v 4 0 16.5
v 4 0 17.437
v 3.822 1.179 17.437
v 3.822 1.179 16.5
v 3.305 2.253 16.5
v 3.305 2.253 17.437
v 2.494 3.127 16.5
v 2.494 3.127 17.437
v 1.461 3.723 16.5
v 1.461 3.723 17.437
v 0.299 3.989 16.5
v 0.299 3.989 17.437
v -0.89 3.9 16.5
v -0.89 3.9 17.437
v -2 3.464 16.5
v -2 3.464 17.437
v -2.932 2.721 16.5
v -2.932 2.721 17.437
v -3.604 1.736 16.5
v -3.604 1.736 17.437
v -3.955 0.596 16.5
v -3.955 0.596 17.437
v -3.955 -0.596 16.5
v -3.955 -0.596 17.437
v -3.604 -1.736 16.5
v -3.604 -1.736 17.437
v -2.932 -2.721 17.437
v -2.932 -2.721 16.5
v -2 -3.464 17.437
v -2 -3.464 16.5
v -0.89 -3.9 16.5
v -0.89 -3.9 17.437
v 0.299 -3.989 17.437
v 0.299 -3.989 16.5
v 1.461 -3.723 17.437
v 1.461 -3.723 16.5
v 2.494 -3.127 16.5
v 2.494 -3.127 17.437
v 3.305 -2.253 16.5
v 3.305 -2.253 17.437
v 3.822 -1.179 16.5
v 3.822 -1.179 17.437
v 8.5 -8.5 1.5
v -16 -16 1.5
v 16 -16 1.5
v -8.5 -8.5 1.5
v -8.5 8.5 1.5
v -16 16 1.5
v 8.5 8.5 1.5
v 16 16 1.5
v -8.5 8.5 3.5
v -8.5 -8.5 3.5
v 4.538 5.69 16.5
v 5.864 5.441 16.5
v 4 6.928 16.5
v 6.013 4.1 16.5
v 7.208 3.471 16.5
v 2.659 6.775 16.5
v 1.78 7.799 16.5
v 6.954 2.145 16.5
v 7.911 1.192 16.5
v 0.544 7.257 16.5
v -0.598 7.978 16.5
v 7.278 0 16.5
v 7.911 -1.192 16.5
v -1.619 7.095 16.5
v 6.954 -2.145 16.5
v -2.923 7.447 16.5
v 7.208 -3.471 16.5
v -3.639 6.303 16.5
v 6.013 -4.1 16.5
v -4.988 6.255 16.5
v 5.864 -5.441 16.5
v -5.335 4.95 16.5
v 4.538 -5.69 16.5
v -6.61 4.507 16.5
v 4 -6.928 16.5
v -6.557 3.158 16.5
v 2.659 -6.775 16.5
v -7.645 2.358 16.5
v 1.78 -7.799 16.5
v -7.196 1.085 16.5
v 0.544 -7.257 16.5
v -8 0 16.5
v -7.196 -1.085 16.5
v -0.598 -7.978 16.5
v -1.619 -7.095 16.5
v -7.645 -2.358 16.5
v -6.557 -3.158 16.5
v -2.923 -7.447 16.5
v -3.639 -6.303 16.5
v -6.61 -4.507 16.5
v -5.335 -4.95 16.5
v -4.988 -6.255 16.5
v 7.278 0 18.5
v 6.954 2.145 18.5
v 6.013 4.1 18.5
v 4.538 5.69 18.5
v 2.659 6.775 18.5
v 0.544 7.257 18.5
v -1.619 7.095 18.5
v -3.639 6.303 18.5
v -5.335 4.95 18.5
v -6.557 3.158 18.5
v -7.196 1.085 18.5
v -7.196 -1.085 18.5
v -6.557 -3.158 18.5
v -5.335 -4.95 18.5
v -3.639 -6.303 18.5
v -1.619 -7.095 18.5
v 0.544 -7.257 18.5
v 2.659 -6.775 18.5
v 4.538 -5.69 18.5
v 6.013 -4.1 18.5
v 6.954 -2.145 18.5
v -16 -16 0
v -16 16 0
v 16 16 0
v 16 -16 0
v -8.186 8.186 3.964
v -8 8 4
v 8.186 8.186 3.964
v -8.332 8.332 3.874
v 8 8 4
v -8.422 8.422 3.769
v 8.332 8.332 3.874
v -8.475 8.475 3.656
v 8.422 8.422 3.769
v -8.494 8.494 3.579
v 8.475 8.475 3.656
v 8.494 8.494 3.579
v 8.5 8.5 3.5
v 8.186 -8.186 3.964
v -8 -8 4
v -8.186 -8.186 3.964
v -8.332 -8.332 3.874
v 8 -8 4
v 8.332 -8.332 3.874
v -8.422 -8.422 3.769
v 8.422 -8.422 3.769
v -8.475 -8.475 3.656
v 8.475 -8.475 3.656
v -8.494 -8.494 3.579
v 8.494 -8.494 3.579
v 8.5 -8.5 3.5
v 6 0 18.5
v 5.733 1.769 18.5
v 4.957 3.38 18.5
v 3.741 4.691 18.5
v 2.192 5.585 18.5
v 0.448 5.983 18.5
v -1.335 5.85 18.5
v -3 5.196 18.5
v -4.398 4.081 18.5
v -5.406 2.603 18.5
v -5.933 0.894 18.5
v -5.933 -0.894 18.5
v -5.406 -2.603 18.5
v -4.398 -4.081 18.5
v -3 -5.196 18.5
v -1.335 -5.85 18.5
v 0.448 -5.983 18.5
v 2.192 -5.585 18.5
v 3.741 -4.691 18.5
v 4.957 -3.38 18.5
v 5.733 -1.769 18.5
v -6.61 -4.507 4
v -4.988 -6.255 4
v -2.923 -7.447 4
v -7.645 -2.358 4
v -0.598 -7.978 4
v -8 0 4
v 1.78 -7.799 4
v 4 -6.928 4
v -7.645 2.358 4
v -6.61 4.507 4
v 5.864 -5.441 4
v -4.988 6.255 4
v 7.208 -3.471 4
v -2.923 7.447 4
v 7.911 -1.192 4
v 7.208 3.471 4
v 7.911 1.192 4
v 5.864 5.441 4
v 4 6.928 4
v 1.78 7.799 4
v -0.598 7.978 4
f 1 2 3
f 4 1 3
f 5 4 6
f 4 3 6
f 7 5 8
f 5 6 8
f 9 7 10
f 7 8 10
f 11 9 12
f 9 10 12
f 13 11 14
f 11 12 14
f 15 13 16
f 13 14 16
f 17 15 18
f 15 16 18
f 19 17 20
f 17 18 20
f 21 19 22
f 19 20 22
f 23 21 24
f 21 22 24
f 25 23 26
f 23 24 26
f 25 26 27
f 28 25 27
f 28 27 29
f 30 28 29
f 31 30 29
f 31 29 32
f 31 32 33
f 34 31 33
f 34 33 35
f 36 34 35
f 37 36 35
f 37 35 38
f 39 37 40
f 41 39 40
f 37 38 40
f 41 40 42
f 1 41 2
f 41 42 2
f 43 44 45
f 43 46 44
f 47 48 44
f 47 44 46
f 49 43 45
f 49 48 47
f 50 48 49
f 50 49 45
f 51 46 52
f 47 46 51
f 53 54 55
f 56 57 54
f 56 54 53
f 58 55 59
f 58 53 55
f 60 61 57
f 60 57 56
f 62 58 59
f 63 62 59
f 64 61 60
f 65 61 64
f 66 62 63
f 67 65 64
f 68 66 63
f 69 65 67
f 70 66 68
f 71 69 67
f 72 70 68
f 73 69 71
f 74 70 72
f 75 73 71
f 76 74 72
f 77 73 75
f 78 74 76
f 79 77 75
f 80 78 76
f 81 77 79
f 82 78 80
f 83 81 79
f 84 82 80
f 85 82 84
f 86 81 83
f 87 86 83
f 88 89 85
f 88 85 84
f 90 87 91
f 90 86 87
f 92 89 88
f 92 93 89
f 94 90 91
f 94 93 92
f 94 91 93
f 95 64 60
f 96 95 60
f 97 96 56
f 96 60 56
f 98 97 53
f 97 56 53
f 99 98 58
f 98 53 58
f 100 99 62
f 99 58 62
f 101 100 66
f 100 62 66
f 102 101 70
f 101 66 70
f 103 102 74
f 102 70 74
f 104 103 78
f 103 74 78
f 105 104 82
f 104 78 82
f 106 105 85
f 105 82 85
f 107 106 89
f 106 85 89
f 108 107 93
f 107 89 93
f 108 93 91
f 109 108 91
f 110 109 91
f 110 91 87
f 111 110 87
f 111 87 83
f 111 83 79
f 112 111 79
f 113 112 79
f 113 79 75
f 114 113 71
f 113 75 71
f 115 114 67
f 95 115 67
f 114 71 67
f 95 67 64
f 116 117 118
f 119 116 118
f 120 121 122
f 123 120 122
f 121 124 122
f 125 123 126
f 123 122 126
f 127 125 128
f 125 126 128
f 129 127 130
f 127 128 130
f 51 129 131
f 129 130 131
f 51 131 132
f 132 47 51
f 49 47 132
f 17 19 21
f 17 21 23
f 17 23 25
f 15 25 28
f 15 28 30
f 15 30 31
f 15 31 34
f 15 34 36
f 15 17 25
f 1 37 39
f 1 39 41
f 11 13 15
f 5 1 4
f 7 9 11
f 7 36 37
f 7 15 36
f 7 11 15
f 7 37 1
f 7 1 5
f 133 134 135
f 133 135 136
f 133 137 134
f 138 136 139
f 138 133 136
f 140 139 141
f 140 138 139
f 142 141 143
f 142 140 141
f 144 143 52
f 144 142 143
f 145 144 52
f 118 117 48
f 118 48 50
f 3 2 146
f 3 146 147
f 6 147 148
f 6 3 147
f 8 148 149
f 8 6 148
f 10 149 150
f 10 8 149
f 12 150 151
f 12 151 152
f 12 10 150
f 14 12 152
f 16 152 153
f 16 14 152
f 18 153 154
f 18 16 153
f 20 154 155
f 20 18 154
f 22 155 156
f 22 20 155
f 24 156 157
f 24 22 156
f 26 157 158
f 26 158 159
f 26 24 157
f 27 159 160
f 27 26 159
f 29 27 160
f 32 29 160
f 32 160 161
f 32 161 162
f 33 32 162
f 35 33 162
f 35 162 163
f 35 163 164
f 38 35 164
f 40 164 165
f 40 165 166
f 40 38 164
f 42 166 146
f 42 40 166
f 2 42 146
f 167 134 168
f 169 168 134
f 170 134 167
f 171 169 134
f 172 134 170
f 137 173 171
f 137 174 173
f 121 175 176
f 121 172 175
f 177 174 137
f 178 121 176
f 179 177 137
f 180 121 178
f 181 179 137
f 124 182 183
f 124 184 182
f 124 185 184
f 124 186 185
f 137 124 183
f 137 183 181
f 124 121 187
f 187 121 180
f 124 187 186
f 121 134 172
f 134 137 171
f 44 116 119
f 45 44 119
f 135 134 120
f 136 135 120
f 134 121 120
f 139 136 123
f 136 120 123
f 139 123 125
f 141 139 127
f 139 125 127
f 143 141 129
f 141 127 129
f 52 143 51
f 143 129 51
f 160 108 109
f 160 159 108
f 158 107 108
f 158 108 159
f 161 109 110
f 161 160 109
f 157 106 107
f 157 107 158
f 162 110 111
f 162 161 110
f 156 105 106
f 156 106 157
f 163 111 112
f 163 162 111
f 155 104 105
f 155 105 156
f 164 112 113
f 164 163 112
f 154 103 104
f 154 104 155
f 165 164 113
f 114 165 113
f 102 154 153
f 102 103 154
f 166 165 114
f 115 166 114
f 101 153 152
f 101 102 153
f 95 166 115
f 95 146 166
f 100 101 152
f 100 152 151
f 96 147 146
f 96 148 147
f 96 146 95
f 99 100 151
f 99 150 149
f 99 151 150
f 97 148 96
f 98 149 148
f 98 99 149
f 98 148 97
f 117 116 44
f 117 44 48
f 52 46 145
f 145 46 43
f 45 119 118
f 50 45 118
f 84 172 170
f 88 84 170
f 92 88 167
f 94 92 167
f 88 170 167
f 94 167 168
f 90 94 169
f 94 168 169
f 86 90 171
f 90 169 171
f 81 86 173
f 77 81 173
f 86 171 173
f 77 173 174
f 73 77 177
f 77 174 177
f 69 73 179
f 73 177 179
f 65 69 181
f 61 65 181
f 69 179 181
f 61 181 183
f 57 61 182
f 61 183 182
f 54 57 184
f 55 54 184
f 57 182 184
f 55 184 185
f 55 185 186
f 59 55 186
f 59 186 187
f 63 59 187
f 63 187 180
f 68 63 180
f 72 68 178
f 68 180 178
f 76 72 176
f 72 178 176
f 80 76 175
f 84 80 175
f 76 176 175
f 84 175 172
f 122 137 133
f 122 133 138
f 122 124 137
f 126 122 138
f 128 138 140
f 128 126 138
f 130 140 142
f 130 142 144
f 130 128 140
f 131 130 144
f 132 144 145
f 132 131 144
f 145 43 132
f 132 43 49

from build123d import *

# Parameters (mm, degrees)
SKETCH1_W           = 32
SKETCH1_H           = 32
BOSS_EXTRUDE1_DEPTH = 1.5
SKETCH3_W           = 17
SKETCH3_H           = 17
BOSS_EXTRUDE2_DEPTH = 2.5
SKETCH4_R           = 8
BOSS_EXTRUDE3_DEPTH = 12.5
SKETCH5_R           = 7.277770315
BOSS_EXTRUDE4_DEPTH = 2
SKETCH6_R           = 4
CUT_EXTRUDE1_DEPTH  = 2
CHAMFER1_SIZE       = 2
CHAMFER1_SIZE2      = 1.063418863
FILLET2_R           = 0.5


with BuildPart() as part:
    # Sketch1 → Boss-Extrude1 (new body)
    with BuildSketch(Plane.XY):
        Rectangle(SKETCH1_W, SKETCH1_H)
    extrude(amount=BOSS_EXTRUDE1_DEPTH)

    # Sketch3 → Boss-Extrude2 (add)
    with BuildSketch(Plane.XY.offset(1.5)):
        Rectangle(SKETCH3_W, SKETCH3_H)
    extrude(amount=BOSS_EXTRUDE2_DEPTH)

    # Sketch4 → Boss-Extrude3 (add)
    with BuildSketch(Plane.XY.offset(4)):
        with Locations(Location((0, 0, 0), (0, 0, 180))):
            Circle(SKETCH4_R)
    extrude(amount=BOSS_EXTRUDE3_DEPTH)

    # Sketch5 → Boss-Extrude4 (add)
    with BuildSketch(Plane.XY.offset(16.5)):
        Circle(SKETCH5_R)
    extrude(amount=BOSS_EXTRUDE4_DEPTH)

    # Sketch6 → Cut-Extrude1 (cut)
    with BuildSketch(Plane.XY.offset(18.5)):
        Circle(SKETCH6_R)
    extrude(amount=-CUT_EXTRUDE1_DEPTH, mode=Mode.SUBTRACT)

    # Chamfer1
    chamfer1_edges = [part.edges().sort_by_distance(p)[0] for p in [
        (-4, 0, 18.5),
    ]]
    chamfer1_side = [part.faces().sort_by_distance(p)[0] for p in [
        (-7.071923885, 0, 18.5),
    ]]
    chamfer(chamfer1_edges, length=CHAMFER1_SIZE, length2=CHAMFER1_SIZE2, reference=chamfer1_side[0])

    # Fillet2
    fillet2_edges = [part.edges().sort_by_distance(p)[0] for p in [
        (8.5, 0, 4),
        (0, 8.5, 4),
        (-8.5, 0, 4),
        (0, -8.5, 4),
    ]]
    fillet(fillet2_edges, radius=FILLET2_R - 0.0001)  # a hair under: the kernel refuses the full size


solid = part.part
